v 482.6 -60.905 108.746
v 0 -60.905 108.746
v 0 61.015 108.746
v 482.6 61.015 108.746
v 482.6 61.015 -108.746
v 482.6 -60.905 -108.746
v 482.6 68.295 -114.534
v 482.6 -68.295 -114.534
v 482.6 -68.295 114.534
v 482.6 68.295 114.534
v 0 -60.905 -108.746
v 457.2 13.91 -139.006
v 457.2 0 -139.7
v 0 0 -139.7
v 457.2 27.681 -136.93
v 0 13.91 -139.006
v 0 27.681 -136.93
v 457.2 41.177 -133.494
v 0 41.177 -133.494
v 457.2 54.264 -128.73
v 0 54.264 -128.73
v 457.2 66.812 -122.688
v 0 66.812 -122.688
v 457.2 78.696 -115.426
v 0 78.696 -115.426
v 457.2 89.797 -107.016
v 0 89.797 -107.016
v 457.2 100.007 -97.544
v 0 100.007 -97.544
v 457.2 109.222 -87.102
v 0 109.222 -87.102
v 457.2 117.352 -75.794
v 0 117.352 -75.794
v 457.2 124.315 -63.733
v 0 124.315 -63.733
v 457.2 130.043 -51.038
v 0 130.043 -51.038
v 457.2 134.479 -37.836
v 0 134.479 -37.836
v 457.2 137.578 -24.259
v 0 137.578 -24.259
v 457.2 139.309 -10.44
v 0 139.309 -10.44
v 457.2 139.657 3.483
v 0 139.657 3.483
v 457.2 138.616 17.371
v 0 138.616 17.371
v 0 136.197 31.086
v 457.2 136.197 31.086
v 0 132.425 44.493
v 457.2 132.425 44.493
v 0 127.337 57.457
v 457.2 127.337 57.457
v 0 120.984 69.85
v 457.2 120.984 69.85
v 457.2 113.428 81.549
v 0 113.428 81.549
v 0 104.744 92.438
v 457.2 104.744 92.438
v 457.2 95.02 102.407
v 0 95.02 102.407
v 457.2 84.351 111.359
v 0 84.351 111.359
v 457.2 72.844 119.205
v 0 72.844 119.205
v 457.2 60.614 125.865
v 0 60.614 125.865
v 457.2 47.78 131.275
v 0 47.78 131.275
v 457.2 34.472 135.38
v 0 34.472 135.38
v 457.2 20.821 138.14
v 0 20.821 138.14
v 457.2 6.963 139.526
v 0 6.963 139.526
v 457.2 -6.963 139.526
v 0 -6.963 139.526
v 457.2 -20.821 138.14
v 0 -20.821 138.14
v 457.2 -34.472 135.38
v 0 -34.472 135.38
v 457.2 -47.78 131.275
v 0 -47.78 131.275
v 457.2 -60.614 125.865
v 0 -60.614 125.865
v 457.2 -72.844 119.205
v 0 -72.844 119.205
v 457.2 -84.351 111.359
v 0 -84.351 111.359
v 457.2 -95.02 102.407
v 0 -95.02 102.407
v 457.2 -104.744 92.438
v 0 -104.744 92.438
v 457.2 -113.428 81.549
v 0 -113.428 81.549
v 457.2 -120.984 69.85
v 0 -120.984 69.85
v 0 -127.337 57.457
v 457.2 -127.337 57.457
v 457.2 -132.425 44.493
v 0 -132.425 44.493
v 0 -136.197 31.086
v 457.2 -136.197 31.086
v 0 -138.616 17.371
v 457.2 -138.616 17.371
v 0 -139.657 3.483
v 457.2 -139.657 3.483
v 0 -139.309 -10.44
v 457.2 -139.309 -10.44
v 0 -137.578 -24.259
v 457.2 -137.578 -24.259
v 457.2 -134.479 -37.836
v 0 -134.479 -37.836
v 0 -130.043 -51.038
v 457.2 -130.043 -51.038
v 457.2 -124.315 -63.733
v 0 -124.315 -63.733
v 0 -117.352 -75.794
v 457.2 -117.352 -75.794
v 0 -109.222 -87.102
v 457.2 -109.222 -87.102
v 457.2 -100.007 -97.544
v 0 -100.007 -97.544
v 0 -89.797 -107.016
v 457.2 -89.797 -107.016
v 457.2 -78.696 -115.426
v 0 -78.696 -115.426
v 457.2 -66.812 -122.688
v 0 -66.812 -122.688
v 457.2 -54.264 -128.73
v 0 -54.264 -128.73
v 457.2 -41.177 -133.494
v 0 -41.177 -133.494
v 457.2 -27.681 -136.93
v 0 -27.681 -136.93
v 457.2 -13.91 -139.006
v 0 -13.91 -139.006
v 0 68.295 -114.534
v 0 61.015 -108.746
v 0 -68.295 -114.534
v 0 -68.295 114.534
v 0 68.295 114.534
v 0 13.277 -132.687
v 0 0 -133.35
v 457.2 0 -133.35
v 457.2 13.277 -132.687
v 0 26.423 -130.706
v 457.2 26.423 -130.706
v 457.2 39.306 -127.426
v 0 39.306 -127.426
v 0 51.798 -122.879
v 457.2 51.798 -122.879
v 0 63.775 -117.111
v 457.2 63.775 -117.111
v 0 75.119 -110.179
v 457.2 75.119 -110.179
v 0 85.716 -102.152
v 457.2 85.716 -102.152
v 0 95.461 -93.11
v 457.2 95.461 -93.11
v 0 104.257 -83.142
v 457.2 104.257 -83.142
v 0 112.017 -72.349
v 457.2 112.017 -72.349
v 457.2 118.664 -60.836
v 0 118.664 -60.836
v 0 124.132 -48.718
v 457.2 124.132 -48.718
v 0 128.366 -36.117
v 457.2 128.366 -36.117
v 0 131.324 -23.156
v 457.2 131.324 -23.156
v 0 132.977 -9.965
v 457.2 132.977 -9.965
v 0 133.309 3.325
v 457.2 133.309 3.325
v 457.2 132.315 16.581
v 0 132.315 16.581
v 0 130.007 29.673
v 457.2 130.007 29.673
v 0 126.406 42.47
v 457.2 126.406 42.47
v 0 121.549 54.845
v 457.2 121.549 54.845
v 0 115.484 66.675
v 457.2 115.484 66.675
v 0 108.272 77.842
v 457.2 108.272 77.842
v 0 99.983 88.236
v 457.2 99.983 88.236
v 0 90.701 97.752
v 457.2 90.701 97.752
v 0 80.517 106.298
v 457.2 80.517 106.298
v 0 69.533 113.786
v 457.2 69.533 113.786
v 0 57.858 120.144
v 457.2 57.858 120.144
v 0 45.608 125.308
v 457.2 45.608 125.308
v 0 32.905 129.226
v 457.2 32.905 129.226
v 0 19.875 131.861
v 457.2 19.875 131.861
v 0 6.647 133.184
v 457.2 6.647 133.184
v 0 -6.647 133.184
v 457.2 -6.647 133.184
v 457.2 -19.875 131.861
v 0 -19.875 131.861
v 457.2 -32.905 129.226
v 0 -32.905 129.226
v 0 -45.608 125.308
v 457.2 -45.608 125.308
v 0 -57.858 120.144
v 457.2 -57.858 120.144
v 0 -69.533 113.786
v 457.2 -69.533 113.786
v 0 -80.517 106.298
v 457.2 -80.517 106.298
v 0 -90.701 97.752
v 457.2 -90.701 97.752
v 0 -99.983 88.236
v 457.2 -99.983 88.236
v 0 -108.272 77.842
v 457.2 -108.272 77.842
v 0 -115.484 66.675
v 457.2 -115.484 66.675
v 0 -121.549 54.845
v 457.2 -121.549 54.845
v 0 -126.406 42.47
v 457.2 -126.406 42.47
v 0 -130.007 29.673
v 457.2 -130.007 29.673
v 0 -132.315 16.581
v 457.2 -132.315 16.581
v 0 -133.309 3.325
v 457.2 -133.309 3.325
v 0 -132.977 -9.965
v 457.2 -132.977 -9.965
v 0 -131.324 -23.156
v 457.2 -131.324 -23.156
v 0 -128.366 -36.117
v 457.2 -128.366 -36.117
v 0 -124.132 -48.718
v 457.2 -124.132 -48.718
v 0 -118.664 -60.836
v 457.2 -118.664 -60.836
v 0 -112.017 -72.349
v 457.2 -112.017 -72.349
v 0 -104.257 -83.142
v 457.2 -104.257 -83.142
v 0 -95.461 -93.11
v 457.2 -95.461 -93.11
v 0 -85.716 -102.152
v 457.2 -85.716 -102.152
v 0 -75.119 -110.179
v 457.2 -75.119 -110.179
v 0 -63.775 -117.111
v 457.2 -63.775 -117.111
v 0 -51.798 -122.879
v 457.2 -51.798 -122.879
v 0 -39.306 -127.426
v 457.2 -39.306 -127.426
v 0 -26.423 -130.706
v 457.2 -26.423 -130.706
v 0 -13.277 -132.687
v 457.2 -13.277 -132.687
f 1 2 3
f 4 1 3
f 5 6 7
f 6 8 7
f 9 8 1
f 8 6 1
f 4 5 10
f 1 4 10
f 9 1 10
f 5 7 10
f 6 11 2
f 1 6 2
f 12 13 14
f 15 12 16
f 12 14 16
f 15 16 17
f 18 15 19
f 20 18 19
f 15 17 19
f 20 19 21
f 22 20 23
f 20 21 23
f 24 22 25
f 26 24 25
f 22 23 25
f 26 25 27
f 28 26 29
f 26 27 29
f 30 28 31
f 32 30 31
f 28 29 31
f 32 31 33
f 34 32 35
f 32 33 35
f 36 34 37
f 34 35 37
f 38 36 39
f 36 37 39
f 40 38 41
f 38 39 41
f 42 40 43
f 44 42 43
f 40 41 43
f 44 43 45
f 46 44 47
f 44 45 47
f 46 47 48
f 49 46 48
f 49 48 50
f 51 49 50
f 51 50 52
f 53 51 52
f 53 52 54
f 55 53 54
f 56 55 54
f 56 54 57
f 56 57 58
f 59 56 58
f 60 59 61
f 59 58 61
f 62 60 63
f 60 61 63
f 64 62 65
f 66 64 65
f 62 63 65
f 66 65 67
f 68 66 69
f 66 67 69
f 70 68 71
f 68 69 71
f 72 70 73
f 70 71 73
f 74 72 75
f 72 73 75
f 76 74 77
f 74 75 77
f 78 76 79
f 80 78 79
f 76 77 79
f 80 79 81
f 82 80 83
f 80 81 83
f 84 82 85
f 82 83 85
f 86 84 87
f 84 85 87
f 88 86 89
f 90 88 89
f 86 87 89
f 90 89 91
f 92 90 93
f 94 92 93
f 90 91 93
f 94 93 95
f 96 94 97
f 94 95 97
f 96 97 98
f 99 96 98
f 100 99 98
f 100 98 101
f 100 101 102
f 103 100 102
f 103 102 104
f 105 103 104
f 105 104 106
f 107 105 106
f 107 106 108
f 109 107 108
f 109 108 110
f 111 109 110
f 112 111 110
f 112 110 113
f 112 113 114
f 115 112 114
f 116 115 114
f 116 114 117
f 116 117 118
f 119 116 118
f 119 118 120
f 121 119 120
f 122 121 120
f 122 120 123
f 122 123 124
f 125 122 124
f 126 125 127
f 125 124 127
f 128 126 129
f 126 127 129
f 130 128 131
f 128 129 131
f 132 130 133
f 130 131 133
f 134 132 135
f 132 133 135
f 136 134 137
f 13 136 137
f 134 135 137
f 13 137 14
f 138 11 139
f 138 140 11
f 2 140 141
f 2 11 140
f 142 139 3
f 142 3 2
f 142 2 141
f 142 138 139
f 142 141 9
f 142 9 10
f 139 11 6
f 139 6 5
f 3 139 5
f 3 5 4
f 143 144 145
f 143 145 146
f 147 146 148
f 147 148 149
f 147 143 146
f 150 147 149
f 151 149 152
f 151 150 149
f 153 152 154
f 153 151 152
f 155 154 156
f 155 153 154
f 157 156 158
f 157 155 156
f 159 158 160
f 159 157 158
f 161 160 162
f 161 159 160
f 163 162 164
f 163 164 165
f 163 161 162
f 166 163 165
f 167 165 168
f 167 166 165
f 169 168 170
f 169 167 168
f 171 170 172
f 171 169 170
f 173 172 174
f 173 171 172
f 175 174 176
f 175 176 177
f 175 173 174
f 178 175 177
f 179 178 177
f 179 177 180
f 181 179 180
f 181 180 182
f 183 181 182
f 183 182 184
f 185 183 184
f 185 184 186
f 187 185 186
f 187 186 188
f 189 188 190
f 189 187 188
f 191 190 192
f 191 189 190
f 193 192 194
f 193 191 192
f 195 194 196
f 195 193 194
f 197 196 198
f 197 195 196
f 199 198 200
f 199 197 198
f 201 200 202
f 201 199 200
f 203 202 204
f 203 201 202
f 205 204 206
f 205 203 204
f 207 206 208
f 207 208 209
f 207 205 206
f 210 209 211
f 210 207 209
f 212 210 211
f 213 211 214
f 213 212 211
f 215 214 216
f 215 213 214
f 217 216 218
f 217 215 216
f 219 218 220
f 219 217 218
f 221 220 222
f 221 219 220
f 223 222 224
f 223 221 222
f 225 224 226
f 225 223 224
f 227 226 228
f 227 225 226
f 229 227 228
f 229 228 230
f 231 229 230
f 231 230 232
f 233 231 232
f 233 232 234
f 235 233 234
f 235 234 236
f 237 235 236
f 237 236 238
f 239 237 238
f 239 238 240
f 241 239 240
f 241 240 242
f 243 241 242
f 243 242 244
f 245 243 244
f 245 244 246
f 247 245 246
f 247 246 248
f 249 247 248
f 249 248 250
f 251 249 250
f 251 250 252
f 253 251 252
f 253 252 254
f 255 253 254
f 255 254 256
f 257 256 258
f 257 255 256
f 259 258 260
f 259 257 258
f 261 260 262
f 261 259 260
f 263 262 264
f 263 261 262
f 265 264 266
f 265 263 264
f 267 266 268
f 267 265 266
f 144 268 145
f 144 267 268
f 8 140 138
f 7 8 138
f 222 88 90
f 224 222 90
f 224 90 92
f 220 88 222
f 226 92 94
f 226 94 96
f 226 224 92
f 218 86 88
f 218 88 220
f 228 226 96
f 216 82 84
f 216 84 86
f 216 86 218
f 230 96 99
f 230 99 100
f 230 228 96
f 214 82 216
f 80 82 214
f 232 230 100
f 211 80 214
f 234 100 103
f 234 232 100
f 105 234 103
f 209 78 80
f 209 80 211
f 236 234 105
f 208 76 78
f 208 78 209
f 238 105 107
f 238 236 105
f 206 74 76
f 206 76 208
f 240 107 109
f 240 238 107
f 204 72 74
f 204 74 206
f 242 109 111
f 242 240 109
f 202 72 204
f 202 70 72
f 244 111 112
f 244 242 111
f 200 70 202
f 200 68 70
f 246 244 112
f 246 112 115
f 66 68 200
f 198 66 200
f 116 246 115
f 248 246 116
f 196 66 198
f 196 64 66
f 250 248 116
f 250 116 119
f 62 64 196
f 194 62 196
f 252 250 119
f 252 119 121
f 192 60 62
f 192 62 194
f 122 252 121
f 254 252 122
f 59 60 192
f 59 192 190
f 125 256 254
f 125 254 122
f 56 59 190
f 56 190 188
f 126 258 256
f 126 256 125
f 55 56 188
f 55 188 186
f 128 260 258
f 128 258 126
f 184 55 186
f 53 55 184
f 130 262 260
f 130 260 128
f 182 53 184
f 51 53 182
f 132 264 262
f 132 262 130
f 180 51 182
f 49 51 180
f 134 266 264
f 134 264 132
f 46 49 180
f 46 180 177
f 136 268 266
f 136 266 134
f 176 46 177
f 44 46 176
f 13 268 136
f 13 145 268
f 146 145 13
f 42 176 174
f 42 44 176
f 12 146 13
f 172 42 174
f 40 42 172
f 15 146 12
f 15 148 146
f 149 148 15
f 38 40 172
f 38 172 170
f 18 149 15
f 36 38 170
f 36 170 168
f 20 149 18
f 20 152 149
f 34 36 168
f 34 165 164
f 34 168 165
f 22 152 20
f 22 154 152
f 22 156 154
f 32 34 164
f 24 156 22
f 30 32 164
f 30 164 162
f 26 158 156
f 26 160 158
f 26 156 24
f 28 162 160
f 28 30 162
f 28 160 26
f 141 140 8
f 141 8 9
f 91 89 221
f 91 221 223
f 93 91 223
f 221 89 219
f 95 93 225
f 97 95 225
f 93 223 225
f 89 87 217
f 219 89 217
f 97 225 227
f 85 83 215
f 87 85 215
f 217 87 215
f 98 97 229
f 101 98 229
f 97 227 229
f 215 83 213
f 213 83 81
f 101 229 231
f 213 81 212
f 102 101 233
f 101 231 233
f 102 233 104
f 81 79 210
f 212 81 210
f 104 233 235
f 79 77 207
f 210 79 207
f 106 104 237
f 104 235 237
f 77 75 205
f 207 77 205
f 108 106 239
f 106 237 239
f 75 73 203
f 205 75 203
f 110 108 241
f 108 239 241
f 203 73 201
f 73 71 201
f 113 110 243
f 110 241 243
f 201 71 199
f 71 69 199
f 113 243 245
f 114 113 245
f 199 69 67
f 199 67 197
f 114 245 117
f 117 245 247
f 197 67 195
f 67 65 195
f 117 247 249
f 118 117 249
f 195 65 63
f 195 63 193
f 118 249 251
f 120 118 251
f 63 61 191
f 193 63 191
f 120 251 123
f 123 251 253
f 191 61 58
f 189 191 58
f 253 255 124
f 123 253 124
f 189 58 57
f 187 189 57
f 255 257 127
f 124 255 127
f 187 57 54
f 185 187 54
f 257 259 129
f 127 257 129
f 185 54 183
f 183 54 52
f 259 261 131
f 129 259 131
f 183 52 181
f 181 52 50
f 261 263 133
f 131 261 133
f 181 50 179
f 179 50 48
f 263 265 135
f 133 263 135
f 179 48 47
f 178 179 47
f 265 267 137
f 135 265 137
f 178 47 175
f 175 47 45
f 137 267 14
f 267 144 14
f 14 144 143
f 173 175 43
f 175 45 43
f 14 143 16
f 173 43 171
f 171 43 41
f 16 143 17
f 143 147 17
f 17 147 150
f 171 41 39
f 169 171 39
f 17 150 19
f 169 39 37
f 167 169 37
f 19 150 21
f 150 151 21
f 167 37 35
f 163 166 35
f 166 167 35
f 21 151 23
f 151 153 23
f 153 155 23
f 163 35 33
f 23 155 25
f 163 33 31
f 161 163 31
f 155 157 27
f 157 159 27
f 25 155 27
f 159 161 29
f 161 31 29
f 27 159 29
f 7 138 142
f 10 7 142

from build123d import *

# Parameters (mm, degrees)
SKETCH1_R           = 139.7
SKETCH1_R_2         = 133.35
BOSS_EXTRUDE1_DEPTH = 457.2
SKETCH2_W           = 229.068065434
SKETCH2_H           = 136.589572802
SKETCH2_W_2         = 217.492134406
SKETCH2_H_2         = 121.92
BOSS_EXTRUDE2_DEPTH = 482.6


with BuildPart() as part:
    # Sketch1 → Boss-Extrude1 (new body)
    with BuildSketch(Plane(origin=(0, 0, 0), x_dir=(0, 0, -1), z_dir=(1, 0, 0))):
        Circle(SKETCH1_R)
        Circle(SKETCH1_R_2, mode=Mode.SUBTRACT)
    extrude(amount=BOSS_EXTRUDE1_DEPTH)


with BuildPart() as body_2:
    # Sketch2 → Boss-Extrude2 (new body)
    with BuildSketch(Plane.ZY):
        Rectangle(SKETCH2_W, SKETCH2_H)
        with Locations((0, 0.054517132)):
            Rectangle(SKETCH2_W_2, SKETCH2_H_2, mode=Mode.SUBTRACT)
    extrude(amount=-BOSS_EXTRUDE2_DEPTH)


solid = Compound([part.part, body_2.part])
